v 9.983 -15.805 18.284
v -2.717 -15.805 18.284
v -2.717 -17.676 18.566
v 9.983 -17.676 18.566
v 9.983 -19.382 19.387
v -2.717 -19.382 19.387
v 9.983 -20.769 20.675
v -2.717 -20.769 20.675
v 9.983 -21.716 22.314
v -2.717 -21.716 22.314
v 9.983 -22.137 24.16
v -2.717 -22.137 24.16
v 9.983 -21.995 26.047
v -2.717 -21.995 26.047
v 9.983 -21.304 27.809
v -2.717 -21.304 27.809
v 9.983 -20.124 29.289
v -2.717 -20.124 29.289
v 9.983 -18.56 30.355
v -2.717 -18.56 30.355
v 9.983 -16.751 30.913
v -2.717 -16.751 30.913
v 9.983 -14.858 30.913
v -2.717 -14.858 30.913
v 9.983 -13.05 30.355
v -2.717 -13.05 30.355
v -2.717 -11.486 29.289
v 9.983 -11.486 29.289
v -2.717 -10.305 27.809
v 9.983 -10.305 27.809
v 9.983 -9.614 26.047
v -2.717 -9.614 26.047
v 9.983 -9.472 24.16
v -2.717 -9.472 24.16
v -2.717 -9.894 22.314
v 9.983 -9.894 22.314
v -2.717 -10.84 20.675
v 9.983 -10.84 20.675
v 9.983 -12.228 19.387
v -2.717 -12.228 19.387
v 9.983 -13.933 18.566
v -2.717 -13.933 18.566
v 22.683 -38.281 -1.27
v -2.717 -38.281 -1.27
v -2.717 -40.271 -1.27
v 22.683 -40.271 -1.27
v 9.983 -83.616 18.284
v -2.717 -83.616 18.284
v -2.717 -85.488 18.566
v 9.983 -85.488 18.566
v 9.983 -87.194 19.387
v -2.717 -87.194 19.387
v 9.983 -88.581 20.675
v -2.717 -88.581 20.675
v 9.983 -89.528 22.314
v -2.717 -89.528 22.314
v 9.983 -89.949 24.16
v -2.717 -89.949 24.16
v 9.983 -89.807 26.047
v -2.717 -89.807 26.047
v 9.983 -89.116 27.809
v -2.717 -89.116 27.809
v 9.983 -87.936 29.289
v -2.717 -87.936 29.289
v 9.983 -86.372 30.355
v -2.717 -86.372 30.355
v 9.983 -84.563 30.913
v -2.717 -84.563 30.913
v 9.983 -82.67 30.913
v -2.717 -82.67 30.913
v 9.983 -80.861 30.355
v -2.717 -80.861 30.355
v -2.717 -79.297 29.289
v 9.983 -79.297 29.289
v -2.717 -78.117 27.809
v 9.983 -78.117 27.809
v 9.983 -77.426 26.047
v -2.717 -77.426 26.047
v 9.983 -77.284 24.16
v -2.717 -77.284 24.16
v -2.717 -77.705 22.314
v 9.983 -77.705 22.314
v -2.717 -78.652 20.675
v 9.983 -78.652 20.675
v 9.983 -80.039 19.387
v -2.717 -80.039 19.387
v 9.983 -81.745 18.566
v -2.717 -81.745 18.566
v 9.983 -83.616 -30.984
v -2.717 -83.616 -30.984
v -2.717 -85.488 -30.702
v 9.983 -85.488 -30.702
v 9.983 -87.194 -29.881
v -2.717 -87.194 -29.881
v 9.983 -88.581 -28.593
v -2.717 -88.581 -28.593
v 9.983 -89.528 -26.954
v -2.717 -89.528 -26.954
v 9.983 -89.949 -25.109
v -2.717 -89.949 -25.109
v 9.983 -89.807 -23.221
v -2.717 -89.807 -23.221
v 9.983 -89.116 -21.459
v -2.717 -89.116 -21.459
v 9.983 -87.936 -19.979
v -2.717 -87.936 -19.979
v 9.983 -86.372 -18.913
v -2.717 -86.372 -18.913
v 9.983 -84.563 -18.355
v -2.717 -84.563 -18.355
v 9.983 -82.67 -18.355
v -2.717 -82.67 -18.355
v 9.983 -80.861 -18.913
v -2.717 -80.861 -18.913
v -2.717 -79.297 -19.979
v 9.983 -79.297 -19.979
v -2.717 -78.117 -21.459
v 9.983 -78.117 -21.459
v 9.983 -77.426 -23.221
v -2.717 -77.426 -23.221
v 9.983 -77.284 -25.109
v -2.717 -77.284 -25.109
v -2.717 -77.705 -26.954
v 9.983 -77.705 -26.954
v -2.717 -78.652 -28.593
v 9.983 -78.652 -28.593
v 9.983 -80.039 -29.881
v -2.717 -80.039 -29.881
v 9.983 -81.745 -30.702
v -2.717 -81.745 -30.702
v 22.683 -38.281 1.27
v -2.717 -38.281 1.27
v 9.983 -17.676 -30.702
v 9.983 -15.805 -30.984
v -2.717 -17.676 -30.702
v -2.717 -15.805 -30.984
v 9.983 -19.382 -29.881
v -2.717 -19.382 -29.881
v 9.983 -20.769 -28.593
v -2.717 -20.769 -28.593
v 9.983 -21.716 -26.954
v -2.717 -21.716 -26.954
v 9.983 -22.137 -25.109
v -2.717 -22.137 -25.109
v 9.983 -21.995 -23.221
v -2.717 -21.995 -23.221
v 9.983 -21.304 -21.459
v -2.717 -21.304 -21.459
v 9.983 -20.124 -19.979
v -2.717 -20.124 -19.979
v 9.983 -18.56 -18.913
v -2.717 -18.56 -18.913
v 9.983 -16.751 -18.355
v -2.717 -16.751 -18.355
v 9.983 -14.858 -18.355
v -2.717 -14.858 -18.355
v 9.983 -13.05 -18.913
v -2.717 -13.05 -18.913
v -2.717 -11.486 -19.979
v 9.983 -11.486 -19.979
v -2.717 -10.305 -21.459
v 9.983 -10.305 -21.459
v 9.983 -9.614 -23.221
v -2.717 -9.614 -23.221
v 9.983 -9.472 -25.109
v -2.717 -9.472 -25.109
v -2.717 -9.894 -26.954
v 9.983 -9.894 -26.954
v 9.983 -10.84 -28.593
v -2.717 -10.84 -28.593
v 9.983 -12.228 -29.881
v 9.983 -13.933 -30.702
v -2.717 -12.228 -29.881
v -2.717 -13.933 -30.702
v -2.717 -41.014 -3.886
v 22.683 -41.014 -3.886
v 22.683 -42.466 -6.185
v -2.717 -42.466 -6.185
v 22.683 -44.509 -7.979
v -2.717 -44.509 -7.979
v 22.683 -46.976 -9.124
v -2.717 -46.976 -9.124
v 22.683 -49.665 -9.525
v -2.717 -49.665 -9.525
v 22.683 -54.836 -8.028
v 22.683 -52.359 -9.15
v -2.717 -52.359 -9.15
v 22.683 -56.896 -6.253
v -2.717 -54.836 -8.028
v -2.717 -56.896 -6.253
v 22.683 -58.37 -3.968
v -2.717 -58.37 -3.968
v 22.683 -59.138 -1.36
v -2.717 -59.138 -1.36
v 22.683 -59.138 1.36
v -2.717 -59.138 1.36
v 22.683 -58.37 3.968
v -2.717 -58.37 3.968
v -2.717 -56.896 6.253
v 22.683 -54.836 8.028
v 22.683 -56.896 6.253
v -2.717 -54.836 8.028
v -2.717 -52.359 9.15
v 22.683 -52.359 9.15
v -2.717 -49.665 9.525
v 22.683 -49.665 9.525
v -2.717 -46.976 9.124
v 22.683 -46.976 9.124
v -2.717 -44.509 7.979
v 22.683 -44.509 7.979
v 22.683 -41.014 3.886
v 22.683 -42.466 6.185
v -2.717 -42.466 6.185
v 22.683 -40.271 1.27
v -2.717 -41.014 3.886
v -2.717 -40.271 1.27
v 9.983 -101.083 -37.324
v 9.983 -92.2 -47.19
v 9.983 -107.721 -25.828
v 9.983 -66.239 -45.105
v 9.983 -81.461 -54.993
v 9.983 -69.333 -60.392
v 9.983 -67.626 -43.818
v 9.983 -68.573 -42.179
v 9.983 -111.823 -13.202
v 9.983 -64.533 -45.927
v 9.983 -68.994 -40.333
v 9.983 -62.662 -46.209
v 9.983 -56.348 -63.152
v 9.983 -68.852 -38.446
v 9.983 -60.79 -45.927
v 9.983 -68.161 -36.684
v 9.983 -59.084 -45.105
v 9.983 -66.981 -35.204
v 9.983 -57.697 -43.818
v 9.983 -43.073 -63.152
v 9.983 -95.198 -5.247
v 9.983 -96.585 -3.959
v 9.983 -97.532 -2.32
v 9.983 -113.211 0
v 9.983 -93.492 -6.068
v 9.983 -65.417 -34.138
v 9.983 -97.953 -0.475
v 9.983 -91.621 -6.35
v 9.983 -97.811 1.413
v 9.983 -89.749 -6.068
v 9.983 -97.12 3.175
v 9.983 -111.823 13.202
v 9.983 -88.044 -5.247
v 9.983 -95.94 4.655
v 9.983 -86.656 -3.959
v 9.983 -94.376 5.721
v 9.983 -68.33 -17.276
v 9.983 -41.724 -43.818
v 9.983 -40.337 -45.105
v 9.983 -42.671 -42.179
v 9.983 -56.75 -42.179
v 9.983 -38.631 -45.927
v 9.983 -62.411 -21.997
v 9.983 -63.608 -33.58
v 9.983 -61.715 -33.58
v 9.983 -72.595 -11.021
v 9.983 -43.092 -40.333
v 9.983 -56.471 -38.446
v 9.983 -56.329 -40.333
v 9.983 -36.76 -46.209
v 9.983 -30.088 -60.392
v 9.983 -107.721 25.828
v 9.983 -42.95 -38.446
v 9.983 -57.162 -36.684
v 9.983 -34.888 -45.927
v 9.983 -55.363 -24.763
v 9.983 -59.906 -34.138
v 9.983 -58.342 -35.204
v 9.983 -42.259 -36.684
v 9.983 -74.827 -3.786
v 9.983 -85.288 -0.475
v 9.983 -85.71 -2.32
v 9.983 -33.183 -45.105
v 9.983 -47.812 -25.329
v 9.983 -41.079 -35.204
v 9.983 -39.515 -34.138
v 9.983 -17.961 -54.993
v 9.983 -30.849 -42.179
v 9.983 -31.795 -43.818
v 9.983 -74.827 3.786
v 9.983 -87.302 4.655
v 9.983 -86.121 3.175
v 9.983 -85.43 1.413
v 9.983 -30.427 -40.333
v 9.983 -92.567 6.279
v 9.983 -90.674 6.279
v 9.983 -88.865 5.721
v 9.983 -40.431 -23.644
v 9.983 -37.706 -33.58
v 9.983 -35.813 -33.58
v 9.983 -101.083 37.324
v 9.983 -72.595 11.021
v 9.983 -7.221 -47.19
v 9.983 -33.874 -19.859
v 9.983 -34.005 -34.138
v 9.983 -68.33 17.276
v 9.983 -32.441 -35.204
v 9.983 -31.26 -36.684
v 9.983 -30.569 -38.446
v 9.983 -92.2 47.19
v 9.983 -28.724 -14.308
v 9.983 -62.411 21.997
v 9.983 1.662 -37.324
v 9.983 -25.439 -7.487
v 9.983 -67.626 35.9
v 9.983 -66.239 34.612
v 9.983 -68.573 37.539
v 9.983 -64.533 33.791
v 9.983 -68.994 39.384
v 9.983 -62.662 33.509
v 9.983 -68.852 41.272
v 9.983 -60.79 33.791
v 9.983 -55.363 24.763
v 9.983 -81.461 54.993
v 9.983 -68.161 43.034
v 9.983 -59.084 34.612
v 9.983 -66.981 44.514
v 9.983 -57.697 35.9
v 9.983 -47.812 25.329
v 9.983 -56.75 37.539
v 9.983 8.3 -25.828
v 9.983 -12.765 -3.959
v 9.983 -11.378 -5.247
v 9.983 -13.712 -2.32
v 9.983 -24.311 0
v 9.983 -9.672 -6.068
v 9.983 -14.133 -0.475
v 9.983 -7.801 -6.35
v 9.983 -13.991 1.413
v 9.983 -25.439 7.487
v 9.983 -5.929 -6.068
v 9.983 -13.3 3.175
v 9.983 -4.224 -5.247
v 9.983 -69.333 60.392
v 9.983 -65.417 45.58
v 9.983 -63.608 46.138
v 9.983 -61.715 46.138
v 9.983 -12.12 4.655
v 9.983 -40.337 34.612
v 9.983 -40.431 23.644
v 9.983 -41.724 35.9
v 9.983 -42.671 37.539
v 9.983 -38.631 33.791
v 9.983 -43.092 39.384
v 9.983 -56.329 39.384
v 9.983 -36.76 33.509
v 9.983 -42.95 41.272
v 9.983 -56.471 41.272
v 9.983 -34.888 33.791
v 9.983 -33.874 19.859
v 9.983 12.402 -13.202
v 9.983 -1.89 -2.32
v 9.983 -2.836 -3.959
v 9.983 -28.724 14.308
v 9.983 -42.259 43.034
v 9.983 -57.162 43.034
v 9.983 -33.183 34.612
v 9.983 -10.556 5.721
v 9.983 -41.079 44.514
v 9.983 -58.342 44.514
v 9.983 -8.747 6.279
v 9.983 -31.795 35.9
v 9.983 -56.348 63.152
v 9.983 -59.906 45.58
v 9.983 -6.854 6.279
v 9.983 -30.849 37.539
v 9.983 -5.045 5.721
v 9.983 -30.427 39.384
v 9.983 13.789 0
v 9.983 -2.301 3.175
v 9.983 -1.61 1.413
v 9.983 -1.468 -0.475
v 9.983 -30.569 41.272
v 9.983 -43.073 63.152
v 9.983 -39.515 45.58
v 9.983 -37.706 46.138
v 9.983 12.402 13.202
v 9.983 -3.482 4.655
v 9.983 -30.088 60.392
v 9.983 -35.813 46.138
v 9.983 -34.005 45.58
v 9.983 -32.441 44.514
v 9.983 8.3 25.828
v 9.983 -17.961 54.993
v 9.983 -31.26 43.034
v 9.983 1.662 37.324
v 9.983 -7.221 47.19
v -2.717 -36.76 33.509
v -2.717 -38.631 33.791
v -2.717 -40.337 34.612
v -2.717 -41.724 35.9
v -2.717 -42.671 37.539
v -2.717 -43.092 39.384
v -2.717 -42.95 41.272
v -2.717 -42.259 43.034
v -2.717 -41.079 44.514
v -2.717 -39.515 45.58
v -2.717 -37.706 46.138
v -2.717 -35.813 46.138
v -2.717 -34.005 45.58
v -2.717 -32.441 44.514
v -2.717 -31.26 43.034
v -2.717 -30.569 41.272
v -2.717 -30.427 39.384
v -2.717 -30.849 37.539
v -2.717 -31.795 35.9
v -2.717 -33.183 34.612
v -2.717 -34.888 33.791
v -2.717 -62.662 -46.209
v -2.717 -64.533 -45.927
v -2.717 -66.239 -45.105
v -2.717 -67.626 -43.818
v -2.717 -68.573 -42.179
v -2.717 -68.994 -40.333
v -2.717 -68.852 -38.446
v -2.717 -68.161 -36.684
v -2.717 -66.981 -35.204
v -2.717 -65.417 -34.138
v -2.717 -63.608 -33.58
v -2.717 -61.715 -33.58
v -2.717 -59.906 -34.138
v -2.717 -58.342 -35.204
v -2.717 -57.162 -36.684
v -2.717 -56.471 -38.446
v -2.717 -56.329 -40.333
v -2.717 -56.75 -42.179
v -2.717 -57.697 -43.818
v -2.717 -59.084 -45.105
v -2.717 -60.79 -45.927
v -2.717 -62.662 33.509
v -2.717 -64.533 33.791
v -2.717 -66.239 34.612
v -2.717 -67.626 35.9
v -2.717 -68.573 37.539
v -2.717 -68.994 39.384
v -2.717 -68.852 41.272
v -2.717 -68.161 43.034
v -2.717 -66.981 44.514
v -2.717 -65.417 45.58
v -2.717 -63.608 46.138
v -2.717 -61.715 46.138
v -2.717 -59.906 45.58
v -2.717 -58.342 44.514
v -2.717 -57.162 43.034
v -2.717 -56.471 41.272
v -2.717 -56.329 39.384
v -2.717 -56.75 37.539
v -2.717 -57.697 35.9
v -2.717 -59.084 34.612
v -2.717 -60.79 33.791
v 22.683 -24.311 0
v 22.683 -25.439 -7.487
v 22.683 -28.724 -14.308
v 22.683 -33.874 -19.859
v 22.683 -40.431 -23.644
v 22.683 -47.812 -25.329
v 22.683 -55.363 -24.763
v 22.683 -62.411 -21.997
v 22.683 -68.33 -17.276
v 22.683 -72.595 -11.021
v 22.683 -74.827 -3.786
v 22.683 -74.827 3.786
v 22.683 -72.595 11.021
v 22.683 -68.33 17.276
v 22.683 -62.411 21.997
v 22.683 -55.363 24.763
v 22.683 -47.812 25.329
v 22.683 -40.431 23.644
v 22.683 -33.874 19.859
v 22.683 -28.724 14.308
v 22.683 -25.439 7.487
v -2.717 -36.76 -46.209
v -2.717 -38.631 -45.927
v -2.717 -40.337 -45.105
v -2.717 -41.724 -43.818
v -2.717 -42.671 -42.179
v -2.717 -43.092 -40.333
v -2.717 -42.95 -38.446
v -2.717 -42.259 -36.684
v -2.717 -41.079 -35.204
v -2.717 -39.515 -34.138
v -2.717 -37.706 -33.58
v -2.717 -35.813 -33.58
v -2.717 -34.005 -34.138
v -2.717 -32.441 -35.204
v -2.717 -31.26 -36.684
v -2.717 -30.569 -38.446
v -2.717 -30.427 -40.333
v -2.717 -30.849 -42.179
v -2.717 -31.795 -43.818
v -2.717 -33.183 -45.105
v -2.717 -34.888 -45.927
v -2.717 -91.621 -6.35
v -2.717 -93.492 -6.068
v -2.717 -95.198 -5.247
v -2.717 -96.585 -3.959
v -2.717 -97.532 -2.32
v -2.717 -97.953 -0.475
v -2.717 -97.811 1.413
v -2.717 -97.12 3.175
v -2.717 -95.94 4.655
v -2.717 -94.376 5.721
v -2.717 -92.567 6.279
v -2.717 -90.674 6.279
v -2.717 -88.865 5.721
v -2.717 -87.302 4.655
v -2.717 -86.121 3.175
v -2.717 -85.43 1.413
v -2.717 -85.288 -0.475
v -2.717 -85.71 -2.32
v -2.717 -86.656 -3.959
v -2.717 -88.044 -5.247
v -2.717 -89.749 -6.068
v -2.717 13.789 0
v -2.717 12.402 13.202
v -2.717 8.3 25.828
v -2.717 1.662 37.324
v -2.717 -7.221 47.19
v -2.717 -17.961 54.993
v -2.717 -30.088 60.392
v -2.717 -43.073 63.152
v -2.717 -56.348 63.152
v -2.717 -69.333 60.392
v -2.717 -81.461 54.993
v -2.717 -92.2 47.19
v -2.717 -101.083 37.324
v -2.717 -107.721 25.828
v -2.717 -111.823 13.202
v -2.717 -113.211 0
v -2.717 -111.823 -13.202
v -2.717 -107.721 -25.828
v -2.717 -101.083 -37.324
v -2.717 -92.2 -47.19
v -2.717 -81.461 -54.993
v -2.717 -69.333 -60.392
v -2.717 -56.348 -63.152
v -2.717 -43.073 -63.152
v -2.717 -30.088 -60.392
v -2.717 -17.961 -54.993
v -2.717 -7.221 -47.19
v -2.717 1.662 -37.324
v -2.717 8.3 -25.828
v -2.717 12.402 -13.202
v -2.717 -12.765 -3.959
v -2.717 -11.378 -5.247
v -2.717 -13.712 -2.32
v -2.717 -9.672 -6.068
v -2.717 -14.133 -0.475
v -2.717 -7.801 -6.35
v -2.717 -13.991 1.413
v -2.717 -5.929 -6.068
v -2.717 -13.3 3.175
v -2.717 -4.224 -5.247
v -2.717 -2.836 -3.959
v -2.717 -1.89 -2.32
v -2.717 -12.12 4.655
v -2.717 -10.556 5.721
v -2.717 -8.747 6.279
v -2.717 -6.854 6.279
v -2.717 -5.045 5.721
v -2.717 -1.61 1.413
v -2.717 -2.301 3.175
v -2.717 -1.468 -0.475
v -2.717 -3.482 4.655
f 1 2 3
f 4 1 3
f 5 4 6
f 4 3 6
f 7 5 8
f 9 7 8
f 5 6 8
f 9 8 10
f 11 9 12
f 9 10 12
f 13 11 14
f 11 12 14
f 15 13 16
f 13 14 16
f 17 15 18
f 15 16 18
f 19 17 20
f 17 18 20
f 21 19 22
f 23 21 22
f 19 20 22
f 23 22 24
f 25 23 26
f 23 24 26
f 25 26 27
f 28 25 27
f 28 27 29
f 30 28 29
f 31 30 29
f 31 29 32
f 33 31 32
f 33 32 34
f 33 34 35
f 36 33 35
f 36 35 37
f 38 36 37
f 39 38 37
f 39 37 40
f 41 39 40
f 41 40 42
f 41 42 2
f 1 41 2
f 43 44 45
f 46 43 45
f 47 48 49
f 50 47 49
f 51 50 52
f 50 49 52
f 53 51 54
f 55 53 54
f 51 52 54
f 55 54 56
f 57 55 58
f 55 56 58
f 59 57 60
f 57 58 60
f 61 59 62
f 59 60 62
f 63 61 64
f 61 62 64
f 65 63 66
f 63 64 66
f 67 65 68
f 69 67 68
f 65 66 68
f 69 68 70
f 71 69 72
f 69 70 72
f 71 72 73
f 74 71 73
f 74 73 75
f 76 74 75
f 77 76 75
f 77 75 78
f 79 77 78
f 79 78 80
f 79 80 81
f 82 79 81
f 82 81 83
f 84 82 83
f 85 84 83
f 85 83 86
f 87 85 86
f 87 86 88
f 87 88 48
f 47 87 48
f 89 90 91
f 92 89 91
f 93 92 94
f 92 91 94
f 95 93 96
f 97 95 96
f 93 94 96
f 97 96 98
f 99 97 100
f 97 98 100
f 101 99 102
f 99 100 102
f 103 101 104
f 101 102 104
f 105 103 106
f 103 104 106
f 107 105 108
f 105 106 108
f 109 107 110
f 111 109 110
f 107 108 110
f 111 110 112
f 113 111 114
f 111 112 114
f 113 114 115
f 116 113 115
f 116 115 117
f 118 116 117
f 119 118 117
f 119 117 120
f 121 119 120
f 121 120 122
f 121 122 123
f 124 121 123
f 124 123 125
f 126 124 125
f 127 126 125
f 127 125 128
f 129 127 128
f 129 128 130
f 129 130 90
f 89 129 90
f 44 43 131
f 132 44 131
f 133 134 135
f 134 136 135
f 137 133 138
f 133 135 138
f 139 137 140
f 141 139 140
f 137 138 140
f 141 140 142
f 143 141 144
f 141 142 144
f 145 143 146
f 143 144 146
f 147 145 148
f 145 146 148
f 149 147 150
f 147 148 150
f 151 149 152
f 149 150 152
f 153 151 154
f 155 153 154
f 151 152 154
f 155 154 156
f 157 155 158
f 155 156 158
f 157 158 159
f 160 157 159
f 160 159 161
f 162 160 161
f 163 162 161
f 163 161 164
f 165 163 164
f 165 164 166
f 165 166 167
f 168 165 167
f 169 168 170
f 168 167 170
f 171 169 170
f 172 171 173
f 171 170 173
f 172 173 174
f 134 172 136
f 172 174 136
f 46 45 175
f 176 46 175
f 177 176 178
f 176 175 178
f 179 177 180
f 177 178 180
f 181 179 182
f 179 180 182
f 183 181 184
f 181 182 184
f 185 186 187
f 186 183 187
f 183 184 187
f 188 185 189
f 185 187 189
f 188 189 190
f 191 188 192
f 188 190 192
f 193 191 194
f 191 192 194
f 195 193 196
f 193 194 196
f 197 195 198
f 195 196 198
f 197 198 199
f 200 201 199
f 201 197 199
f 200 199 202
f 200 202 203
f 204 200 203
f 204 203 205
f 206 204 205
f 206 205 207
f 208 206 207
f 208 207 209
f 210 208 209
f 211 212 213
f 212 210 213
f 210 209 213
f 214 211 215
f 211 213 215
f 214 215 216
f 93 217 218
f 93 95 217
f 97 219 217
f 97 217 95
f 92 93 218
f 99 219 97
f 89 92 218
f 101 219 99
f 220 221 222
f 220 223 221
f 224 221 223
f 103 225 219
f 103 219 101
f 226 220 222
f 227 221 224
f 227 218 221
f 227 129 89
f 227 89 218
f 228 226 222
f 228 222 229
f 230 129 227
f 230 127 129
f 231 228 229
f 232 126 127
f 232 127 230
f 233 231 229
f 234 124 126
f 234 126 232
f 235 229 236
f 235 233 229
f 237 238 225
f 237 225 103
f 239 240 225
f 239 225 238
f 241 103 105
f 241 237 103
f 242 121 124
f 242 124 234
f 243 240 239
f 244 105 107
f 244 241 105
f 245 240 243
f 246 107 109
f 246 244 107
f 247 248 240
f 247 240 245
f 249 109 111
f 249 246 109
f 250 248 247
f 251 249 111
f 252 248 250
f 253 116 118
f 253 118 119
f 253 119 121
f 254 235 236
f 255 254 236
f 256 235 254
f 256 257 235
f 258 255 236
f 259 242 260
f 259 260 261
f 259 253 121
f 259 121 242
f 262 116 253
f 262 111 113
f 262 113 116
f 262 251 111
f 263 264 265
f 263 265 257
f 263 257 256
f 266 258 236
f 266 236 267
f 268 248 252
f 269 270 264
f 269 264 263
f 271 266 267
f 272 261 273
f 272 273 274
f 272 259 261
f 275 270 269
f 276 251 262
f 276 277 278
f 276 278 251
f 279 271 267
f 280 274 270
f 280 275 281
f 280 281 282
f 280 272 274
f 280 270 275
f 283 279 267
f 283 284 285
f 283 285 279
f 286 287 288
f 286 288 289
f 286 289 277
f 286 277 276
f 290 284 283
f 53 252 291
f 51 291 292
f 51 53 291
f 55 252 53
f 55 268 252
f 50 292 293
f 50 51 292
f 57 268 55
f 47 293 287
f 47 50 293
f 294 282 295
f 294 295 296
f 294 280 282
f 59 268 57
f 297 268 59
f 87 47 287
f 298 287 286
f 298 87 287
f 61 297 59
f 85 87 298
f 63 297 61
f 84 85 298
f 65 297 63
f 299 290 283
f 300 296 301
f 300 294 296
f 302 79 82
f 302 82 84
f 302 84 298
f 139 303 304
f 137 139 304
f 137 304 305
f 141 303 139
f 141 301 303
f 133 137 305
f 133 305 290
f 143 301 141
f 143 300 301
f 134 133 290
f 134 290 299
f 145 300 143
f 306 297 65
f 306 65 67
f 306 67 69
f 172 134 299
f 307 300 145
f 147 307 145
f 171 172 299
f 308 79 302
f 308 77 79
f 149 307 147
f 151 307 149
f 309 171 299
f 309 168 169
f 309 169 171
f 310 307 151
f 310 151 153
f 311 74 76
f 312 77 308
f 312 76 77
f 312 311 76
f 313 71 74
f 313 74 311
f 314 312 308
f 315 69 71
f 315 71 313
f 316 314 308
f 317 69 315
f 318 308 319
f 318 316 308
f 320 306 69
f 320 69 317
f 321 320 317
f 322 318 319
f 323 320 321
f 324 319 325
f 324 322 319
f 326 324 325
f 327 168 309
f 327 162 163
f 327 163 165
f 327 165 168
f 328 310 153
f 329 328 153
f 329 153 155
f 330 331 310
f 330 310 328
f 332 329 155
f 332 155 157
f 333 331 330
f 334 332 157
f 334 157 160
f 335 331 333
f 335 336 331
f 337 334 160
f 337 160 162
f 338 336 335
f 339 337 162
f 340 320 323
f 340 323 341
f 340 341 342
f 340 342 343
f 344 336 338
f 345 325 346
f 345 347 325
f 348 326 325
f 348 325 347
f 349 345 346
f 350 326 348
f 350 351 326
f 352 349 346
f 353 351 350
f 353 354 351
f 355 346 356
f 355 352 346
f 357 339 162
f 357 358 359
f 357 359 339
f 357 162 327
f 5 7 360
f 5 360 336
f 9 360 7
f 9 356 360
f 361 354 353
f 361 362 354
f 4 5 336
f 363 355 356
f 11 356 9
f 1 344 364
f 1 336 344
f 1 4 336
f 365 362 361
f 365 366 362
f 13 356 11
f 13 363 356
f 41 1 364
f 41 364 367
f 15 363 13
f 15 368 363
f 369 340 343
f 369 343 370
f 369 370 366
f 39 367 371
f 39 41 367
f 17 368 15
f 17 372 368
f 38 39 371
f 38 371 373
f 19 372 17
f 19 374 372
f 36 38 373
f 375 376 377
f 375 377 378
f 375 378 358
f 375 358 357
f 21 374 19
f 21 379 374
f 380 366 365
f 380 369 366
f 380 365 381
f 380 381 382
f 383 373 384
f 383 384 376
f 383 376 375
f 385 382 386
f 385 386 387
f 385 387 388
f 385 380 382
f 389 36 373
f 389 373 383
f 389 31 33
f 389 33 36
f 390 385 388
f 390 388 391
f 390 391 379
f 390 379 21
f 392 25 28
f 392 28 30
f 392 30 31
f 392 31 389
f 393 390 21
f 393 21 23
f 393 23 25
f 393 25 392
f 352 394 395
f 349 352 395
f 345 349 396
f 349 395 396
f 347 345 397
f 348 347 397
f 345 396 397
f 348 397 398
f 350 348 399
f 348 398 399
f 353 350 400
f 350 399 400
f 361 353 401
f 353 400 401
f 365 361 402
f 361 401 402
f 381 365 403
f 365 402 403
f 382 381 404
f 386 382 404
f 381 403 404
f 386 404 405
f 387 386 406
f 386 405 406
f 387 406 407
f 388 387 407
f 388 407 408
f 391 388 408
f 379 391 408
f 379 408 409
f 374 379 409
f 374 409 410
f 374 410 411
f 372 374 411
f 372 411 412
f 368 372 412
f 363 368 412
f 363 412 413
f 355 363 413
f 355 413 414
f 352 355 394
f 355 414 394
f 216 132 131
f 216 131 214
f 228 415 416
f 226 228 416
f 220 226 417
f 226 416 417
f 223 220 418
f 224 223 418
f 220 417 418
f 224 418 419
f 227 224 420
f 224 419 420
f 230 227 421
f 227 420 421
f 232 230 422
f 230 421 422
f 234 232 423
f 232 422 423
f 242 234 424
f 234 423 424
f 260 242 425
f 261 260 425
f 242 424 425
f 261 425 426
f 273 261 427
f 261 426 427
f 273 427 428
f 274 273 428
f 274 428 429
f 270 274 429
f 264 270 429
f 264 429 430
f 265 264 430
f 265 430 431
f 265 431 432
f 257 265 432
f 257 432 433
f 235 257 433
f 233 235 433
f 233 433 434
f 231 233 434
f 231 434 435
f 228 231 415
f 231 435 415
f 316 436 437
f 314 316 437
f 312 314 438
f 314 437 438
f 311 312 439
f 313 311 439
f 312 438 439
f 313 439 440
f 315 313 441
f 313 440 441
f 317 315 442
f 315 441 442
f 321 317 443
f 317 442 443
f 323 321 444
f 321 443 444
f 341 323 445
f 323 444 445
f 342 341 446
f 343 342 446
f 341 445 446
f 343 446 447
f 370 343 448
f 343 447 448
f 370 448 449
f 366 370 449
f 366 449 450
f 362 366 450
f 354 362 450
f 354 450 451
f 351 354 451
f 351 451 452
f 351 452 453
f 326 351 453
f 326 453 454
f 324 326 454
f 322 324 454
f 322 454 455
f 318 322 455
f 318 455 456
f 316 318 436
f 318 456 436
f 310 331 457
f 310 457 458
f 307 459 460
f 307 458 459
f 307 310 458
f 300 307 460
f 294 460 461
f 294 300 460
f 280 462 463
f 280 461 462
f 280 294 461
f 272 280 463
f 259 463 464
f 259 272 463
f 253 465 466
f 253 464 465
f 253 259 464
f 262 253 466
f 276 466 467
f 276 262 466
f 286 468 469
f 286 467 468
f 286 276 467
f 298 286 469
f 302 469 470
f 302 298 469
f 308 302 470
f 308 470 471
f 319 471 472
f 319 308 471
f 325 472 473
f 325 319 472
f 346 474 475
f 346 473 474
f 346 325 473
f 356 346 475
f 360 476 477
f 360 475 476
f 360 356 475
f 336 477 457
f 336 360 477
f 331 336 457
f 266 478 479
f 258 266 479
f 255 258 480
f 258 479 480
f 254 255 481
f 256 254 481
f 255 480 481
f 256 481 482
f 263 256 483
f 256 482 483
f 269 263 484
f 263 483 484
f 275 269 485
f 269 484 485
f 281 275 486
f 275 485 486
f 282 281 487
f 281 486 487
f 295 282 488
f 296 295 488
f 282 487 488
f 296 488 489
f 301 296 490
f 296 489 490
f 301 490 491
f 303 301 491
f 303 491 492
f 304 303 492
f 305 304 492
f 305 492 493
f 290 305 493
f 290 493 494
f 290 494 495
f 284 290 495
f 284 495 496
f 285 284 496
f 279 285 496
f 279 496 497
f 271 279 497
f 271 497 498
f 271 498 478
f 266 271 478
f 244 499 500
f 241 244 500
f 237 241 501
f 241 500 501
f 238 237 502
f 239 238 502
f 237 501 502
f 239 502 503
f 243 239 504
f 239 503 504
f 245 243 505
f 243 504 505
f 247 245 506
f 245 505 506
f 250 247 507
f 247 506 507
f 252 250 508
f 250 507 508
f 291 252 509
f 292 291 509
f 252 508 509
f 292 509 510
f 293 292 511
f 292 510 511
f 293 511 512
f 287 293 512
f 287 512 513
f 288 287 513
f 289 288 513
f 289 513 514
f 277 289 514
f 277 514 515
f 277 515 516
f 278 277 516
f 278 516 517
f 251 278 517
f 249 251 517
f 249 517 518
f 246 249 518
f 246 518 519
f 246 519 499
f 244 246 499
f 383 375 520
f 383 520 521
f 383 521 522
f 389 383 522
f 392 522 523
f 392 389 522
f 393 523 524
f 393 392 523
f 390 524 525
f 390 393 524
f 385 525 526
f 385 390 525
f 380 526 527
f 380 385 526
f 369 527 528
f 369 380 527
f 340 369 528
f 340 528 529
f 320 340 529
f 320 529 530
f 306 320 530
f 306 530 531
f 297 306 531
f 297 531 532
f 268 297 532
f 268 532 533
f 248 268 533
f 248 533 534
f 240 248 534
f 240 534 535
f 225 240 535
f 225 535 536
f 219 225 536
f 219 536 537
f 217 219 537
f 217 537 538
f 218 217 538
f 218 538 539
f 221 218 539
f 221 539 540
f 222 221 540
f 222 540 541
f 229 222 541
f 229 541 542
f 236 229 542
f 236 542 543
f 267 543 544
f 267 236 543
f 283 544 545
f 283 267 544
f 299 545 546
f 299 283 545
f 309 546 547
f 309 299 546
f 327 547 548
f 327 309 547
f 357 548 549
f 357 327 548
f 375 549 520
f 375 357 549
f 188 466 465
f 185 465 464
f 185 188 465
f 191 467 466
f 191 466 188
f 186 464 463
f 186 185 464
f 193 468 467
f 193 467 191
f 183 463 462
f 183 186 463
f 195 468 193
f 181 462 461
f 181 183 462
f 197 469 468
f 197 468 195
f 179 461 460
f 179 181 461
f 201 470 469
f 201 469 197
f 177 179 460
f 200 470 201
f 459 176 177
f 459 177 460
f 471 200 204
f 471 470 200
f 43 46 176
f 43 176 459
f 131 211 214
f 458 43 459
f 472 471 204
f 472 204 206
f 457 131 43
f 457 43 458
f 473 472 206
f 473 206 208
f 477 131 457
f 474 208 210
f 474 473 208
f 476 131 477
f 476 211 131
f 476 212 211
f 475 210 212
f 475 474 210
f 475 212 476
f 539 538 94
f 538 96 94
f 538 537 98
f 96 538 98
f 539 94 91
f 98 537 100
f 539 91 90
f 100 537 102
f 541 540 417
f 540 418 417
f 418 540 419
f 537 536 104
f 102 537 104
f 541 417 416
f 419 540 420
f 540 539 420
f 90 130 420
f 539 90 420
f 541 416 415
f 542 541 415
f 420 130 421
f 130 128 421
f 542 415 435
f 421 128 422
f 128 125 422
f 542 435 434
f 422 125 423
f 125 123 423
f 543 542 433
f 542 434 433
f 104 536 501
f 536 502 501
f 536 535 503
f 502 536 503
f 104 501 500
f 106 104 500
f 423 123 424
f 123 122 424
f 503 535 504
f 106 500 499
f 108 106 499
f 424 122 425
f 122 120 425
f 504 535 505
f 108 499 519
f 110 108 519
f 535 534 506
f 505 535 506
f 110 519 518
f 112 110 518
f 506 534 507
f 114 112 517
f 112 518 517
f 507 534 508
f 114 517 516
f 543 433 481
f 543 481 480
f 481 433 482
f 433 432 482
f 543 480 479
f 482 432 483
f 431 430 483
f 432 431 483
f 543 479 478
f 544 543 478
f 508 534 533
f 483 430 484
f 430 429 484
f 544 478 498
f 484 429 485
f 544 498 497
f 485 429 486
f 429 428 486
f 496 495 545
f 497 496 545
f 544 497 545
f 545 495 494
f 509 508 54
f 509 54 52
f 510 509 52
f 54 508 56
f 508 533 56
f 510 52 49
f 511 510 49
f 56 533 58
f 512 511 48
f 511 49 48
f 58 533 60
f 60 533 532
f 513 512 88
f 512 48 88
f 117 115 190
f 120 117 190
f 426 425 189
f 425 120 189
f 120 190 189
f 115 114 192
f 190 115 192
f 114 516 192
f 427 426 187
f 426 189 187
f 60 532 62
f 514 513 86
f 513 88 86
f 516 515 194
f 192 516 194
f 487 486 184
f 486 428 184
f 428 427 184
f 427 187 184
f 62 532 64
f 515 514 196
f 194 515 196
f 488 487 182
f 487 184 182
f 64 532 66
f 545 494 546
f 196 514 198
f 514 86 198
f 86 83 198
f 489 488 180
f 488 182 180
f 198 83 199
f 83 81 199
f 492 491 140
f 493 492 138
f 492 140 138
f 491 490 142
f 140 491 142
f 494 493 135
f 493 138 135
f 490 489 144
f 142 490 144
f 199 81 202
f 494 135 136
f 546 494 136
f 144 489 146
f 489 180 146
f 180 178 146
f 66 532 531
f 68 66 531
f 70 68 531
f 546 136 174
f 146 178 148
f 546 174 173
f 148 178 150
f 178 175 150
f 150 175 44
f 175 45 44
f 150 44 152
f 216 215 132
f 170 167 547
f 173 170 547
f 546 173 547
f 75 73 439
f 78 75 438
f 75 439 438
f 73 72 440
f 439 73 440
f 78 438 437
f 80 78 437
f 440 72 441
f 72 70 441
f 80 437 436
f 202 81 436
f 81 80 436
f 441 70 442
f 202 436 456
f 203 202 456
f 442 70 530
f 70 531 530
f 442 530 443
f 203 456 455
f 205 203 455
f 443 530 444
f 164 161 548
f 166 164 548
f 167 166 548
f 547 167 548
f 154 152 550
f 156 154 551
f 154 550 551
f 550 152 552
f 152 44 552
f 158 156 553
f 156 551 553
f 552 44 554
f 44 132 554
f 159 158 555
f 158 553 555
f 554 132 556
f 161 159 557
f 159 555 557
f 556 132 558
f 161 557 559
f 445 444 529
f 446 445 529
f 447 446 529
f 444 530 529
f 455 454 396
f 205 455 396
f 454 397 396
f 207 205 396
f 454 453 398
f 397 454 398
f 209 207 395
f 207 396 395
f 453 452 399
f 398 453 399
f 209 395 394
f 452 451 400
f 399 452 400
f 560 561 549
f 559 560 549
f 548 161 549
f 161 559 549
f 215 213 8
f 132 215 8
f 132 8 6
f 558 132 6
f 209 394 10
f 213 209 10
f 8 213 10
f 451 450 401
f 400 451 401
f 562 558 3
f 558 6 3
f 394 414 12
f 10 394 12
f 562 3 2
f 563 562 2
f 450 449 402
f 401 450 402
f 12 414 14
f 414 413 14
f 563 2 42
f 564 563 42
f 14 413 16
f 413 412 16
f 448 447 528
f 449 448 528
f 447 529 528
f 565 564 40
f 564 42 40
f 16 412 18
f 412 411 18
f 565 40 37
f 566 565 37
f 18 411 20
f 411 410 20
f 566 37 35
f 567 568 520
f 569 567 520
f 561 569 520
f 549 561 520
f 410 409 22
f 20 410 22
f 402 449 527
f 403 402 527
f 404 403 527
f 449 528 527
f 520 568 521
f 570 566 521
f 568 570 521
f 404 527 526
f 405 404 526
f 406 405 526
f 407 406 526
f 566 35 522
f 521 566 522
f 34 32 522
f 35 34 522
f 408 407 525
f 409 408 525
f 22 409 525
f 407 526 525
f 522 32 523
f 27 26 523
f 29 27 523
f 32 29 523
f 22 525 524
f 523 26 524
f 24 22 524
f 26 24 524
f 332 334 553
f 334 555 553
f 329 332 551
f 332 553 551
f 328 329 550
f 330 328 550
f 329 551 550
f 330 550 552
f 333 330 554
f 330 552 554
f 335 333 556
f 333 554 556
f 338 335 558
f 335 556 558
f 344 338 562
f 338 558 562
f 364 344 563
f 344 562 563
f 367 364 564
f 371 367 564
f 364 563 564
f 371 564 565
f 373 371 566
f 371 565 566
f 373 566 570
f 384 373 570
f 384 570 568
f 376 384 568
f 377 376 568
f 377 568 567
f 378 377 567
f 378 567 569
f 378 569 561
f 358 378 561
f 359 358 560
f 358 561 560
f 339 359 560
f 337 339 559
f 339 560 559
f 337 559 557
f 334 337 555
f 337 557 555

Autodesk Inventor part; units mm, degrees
ref_plane "YZ Plane" through (0, 0, 0) normal (1, 0, 0) x (0, 1, 0)
ref_plane "XZ Plane" through (0, 0, 0) normal (0, 1, 0) x (-1, 0, 0)
ref_plane "XY Plane" through (0, 0, 0) normal (0, 0, 1) x (1, 0, 0)
sketch "Sketch1" plane through (0, 0, 0) normal (0, 0, 1) x (1, 0, 0)
  line L0 (-2.7173, 13.7894) -> (9.9827, 13.7894)
  line L1 (9.9827, 13.7894) -> (9.9827, -24.3106)
  line L2 (9.9827, -40.1856) -> (-2.7173, -40.1856)
  line L3 (-2.7173, -40.1856) -> (-2.7173, 13.7894)
  line L4 (-2.7173, -40.1856) -> (22.6827, -40.1856)
  line L5 (22.6827, -40.1856) -> (22.6827, -24.3106)
  line L6 (22.6827, -24.3106) -> (9.9827, -24.3106)
  line L7 (-2.7173, -24.3106) -> (-2.7173, -40.1856)
  line L8 (-16.1487, -49.7106) -> (31.6829, -49.7106)
  point P0 (0, 0)
  dimension "d0" = 12.7
  dimension "d1" = 53.975
  dimension "d4" = 25.4
  dimension "d5" = 15.875
  dimension "d6" = 9.525
revolve "Revolution1" add sketch "Sketch1" angle 360 about axis through (-16.1487, -49.7106, 0) along (1, 0, 0)
sketch "Sketch3" plane through (22.6827, -49.7106, 0) normal (1, 0, 0) x (0, 0, -1)
  line L0 (0, 11.43) -> (-1.27, 11.43)
  line L1 (0, 11.43) -> (1.27, 11.43)
  line L2 (1.27, 11.43) -> (1.27, 9.44)
  circle A0 centre (0, 0) radius 9.525 projected
  line L3 (-1.27, 11.43) -> (-1.27, 9.44)
  line L4 (1.27, 9.44) -> (-1.27, 9.44)
  point P0 (0, 49.7106)
  dimension "d9" = 1.27
  dimension "d10" = 1.27
extrude "Extrusion1" cut sketch "Sketch3" against normal blind 25.4 contours L1 L2 A0 L3 L0
sketch "Sketch7" plane through (22.6827, -49.7106, 0) normal (1, 0, 0) x (0, 0, -1)
  point P0 (0, 49.7106)
  point P1 (0, 0)
  point P2 (0, 41.91)
  point P3 (-24.6341, 33.9059)
  point P4 (-39.8588, 12.9509)
  point P5 (-39.8588, -12.9509)
  point P6 (-24.6341, -33.9059)
  point P7 (0, -41.91)
  point P8 (24.6341, -33.9059)
  point P9 (39.8588, -12.9509)
  point P10 (39.8588, 12.9509)
  point P11 (24.6341, 33.9059)
  dimension "d29" = 41.91
  dimension "d32" = 360
hole "Hole3" at (22.6827, -49.7106, 0) at (22.6827, -7.8006, 0) at (22.6827, -15.8047, 24.6341) at (22.6827, -36.7597, 39.8588) at (22.6827, -62.6615, 39.8588) at (22.6827, -83.6165, 24.6341) at (22.6827, -91.6206, 0) at (22.6827, -83.6165, -24.6341) at (22.6827, -62.6615, -39.8588) at (22.6827, -36.7597, -39.8588) at (22.6827, -15.8047, -24.6341) direction (-1, 0, 0) diameter 12.7 end through all
properties part number "arthurWeiActivity 5.5a#4.dwg"
